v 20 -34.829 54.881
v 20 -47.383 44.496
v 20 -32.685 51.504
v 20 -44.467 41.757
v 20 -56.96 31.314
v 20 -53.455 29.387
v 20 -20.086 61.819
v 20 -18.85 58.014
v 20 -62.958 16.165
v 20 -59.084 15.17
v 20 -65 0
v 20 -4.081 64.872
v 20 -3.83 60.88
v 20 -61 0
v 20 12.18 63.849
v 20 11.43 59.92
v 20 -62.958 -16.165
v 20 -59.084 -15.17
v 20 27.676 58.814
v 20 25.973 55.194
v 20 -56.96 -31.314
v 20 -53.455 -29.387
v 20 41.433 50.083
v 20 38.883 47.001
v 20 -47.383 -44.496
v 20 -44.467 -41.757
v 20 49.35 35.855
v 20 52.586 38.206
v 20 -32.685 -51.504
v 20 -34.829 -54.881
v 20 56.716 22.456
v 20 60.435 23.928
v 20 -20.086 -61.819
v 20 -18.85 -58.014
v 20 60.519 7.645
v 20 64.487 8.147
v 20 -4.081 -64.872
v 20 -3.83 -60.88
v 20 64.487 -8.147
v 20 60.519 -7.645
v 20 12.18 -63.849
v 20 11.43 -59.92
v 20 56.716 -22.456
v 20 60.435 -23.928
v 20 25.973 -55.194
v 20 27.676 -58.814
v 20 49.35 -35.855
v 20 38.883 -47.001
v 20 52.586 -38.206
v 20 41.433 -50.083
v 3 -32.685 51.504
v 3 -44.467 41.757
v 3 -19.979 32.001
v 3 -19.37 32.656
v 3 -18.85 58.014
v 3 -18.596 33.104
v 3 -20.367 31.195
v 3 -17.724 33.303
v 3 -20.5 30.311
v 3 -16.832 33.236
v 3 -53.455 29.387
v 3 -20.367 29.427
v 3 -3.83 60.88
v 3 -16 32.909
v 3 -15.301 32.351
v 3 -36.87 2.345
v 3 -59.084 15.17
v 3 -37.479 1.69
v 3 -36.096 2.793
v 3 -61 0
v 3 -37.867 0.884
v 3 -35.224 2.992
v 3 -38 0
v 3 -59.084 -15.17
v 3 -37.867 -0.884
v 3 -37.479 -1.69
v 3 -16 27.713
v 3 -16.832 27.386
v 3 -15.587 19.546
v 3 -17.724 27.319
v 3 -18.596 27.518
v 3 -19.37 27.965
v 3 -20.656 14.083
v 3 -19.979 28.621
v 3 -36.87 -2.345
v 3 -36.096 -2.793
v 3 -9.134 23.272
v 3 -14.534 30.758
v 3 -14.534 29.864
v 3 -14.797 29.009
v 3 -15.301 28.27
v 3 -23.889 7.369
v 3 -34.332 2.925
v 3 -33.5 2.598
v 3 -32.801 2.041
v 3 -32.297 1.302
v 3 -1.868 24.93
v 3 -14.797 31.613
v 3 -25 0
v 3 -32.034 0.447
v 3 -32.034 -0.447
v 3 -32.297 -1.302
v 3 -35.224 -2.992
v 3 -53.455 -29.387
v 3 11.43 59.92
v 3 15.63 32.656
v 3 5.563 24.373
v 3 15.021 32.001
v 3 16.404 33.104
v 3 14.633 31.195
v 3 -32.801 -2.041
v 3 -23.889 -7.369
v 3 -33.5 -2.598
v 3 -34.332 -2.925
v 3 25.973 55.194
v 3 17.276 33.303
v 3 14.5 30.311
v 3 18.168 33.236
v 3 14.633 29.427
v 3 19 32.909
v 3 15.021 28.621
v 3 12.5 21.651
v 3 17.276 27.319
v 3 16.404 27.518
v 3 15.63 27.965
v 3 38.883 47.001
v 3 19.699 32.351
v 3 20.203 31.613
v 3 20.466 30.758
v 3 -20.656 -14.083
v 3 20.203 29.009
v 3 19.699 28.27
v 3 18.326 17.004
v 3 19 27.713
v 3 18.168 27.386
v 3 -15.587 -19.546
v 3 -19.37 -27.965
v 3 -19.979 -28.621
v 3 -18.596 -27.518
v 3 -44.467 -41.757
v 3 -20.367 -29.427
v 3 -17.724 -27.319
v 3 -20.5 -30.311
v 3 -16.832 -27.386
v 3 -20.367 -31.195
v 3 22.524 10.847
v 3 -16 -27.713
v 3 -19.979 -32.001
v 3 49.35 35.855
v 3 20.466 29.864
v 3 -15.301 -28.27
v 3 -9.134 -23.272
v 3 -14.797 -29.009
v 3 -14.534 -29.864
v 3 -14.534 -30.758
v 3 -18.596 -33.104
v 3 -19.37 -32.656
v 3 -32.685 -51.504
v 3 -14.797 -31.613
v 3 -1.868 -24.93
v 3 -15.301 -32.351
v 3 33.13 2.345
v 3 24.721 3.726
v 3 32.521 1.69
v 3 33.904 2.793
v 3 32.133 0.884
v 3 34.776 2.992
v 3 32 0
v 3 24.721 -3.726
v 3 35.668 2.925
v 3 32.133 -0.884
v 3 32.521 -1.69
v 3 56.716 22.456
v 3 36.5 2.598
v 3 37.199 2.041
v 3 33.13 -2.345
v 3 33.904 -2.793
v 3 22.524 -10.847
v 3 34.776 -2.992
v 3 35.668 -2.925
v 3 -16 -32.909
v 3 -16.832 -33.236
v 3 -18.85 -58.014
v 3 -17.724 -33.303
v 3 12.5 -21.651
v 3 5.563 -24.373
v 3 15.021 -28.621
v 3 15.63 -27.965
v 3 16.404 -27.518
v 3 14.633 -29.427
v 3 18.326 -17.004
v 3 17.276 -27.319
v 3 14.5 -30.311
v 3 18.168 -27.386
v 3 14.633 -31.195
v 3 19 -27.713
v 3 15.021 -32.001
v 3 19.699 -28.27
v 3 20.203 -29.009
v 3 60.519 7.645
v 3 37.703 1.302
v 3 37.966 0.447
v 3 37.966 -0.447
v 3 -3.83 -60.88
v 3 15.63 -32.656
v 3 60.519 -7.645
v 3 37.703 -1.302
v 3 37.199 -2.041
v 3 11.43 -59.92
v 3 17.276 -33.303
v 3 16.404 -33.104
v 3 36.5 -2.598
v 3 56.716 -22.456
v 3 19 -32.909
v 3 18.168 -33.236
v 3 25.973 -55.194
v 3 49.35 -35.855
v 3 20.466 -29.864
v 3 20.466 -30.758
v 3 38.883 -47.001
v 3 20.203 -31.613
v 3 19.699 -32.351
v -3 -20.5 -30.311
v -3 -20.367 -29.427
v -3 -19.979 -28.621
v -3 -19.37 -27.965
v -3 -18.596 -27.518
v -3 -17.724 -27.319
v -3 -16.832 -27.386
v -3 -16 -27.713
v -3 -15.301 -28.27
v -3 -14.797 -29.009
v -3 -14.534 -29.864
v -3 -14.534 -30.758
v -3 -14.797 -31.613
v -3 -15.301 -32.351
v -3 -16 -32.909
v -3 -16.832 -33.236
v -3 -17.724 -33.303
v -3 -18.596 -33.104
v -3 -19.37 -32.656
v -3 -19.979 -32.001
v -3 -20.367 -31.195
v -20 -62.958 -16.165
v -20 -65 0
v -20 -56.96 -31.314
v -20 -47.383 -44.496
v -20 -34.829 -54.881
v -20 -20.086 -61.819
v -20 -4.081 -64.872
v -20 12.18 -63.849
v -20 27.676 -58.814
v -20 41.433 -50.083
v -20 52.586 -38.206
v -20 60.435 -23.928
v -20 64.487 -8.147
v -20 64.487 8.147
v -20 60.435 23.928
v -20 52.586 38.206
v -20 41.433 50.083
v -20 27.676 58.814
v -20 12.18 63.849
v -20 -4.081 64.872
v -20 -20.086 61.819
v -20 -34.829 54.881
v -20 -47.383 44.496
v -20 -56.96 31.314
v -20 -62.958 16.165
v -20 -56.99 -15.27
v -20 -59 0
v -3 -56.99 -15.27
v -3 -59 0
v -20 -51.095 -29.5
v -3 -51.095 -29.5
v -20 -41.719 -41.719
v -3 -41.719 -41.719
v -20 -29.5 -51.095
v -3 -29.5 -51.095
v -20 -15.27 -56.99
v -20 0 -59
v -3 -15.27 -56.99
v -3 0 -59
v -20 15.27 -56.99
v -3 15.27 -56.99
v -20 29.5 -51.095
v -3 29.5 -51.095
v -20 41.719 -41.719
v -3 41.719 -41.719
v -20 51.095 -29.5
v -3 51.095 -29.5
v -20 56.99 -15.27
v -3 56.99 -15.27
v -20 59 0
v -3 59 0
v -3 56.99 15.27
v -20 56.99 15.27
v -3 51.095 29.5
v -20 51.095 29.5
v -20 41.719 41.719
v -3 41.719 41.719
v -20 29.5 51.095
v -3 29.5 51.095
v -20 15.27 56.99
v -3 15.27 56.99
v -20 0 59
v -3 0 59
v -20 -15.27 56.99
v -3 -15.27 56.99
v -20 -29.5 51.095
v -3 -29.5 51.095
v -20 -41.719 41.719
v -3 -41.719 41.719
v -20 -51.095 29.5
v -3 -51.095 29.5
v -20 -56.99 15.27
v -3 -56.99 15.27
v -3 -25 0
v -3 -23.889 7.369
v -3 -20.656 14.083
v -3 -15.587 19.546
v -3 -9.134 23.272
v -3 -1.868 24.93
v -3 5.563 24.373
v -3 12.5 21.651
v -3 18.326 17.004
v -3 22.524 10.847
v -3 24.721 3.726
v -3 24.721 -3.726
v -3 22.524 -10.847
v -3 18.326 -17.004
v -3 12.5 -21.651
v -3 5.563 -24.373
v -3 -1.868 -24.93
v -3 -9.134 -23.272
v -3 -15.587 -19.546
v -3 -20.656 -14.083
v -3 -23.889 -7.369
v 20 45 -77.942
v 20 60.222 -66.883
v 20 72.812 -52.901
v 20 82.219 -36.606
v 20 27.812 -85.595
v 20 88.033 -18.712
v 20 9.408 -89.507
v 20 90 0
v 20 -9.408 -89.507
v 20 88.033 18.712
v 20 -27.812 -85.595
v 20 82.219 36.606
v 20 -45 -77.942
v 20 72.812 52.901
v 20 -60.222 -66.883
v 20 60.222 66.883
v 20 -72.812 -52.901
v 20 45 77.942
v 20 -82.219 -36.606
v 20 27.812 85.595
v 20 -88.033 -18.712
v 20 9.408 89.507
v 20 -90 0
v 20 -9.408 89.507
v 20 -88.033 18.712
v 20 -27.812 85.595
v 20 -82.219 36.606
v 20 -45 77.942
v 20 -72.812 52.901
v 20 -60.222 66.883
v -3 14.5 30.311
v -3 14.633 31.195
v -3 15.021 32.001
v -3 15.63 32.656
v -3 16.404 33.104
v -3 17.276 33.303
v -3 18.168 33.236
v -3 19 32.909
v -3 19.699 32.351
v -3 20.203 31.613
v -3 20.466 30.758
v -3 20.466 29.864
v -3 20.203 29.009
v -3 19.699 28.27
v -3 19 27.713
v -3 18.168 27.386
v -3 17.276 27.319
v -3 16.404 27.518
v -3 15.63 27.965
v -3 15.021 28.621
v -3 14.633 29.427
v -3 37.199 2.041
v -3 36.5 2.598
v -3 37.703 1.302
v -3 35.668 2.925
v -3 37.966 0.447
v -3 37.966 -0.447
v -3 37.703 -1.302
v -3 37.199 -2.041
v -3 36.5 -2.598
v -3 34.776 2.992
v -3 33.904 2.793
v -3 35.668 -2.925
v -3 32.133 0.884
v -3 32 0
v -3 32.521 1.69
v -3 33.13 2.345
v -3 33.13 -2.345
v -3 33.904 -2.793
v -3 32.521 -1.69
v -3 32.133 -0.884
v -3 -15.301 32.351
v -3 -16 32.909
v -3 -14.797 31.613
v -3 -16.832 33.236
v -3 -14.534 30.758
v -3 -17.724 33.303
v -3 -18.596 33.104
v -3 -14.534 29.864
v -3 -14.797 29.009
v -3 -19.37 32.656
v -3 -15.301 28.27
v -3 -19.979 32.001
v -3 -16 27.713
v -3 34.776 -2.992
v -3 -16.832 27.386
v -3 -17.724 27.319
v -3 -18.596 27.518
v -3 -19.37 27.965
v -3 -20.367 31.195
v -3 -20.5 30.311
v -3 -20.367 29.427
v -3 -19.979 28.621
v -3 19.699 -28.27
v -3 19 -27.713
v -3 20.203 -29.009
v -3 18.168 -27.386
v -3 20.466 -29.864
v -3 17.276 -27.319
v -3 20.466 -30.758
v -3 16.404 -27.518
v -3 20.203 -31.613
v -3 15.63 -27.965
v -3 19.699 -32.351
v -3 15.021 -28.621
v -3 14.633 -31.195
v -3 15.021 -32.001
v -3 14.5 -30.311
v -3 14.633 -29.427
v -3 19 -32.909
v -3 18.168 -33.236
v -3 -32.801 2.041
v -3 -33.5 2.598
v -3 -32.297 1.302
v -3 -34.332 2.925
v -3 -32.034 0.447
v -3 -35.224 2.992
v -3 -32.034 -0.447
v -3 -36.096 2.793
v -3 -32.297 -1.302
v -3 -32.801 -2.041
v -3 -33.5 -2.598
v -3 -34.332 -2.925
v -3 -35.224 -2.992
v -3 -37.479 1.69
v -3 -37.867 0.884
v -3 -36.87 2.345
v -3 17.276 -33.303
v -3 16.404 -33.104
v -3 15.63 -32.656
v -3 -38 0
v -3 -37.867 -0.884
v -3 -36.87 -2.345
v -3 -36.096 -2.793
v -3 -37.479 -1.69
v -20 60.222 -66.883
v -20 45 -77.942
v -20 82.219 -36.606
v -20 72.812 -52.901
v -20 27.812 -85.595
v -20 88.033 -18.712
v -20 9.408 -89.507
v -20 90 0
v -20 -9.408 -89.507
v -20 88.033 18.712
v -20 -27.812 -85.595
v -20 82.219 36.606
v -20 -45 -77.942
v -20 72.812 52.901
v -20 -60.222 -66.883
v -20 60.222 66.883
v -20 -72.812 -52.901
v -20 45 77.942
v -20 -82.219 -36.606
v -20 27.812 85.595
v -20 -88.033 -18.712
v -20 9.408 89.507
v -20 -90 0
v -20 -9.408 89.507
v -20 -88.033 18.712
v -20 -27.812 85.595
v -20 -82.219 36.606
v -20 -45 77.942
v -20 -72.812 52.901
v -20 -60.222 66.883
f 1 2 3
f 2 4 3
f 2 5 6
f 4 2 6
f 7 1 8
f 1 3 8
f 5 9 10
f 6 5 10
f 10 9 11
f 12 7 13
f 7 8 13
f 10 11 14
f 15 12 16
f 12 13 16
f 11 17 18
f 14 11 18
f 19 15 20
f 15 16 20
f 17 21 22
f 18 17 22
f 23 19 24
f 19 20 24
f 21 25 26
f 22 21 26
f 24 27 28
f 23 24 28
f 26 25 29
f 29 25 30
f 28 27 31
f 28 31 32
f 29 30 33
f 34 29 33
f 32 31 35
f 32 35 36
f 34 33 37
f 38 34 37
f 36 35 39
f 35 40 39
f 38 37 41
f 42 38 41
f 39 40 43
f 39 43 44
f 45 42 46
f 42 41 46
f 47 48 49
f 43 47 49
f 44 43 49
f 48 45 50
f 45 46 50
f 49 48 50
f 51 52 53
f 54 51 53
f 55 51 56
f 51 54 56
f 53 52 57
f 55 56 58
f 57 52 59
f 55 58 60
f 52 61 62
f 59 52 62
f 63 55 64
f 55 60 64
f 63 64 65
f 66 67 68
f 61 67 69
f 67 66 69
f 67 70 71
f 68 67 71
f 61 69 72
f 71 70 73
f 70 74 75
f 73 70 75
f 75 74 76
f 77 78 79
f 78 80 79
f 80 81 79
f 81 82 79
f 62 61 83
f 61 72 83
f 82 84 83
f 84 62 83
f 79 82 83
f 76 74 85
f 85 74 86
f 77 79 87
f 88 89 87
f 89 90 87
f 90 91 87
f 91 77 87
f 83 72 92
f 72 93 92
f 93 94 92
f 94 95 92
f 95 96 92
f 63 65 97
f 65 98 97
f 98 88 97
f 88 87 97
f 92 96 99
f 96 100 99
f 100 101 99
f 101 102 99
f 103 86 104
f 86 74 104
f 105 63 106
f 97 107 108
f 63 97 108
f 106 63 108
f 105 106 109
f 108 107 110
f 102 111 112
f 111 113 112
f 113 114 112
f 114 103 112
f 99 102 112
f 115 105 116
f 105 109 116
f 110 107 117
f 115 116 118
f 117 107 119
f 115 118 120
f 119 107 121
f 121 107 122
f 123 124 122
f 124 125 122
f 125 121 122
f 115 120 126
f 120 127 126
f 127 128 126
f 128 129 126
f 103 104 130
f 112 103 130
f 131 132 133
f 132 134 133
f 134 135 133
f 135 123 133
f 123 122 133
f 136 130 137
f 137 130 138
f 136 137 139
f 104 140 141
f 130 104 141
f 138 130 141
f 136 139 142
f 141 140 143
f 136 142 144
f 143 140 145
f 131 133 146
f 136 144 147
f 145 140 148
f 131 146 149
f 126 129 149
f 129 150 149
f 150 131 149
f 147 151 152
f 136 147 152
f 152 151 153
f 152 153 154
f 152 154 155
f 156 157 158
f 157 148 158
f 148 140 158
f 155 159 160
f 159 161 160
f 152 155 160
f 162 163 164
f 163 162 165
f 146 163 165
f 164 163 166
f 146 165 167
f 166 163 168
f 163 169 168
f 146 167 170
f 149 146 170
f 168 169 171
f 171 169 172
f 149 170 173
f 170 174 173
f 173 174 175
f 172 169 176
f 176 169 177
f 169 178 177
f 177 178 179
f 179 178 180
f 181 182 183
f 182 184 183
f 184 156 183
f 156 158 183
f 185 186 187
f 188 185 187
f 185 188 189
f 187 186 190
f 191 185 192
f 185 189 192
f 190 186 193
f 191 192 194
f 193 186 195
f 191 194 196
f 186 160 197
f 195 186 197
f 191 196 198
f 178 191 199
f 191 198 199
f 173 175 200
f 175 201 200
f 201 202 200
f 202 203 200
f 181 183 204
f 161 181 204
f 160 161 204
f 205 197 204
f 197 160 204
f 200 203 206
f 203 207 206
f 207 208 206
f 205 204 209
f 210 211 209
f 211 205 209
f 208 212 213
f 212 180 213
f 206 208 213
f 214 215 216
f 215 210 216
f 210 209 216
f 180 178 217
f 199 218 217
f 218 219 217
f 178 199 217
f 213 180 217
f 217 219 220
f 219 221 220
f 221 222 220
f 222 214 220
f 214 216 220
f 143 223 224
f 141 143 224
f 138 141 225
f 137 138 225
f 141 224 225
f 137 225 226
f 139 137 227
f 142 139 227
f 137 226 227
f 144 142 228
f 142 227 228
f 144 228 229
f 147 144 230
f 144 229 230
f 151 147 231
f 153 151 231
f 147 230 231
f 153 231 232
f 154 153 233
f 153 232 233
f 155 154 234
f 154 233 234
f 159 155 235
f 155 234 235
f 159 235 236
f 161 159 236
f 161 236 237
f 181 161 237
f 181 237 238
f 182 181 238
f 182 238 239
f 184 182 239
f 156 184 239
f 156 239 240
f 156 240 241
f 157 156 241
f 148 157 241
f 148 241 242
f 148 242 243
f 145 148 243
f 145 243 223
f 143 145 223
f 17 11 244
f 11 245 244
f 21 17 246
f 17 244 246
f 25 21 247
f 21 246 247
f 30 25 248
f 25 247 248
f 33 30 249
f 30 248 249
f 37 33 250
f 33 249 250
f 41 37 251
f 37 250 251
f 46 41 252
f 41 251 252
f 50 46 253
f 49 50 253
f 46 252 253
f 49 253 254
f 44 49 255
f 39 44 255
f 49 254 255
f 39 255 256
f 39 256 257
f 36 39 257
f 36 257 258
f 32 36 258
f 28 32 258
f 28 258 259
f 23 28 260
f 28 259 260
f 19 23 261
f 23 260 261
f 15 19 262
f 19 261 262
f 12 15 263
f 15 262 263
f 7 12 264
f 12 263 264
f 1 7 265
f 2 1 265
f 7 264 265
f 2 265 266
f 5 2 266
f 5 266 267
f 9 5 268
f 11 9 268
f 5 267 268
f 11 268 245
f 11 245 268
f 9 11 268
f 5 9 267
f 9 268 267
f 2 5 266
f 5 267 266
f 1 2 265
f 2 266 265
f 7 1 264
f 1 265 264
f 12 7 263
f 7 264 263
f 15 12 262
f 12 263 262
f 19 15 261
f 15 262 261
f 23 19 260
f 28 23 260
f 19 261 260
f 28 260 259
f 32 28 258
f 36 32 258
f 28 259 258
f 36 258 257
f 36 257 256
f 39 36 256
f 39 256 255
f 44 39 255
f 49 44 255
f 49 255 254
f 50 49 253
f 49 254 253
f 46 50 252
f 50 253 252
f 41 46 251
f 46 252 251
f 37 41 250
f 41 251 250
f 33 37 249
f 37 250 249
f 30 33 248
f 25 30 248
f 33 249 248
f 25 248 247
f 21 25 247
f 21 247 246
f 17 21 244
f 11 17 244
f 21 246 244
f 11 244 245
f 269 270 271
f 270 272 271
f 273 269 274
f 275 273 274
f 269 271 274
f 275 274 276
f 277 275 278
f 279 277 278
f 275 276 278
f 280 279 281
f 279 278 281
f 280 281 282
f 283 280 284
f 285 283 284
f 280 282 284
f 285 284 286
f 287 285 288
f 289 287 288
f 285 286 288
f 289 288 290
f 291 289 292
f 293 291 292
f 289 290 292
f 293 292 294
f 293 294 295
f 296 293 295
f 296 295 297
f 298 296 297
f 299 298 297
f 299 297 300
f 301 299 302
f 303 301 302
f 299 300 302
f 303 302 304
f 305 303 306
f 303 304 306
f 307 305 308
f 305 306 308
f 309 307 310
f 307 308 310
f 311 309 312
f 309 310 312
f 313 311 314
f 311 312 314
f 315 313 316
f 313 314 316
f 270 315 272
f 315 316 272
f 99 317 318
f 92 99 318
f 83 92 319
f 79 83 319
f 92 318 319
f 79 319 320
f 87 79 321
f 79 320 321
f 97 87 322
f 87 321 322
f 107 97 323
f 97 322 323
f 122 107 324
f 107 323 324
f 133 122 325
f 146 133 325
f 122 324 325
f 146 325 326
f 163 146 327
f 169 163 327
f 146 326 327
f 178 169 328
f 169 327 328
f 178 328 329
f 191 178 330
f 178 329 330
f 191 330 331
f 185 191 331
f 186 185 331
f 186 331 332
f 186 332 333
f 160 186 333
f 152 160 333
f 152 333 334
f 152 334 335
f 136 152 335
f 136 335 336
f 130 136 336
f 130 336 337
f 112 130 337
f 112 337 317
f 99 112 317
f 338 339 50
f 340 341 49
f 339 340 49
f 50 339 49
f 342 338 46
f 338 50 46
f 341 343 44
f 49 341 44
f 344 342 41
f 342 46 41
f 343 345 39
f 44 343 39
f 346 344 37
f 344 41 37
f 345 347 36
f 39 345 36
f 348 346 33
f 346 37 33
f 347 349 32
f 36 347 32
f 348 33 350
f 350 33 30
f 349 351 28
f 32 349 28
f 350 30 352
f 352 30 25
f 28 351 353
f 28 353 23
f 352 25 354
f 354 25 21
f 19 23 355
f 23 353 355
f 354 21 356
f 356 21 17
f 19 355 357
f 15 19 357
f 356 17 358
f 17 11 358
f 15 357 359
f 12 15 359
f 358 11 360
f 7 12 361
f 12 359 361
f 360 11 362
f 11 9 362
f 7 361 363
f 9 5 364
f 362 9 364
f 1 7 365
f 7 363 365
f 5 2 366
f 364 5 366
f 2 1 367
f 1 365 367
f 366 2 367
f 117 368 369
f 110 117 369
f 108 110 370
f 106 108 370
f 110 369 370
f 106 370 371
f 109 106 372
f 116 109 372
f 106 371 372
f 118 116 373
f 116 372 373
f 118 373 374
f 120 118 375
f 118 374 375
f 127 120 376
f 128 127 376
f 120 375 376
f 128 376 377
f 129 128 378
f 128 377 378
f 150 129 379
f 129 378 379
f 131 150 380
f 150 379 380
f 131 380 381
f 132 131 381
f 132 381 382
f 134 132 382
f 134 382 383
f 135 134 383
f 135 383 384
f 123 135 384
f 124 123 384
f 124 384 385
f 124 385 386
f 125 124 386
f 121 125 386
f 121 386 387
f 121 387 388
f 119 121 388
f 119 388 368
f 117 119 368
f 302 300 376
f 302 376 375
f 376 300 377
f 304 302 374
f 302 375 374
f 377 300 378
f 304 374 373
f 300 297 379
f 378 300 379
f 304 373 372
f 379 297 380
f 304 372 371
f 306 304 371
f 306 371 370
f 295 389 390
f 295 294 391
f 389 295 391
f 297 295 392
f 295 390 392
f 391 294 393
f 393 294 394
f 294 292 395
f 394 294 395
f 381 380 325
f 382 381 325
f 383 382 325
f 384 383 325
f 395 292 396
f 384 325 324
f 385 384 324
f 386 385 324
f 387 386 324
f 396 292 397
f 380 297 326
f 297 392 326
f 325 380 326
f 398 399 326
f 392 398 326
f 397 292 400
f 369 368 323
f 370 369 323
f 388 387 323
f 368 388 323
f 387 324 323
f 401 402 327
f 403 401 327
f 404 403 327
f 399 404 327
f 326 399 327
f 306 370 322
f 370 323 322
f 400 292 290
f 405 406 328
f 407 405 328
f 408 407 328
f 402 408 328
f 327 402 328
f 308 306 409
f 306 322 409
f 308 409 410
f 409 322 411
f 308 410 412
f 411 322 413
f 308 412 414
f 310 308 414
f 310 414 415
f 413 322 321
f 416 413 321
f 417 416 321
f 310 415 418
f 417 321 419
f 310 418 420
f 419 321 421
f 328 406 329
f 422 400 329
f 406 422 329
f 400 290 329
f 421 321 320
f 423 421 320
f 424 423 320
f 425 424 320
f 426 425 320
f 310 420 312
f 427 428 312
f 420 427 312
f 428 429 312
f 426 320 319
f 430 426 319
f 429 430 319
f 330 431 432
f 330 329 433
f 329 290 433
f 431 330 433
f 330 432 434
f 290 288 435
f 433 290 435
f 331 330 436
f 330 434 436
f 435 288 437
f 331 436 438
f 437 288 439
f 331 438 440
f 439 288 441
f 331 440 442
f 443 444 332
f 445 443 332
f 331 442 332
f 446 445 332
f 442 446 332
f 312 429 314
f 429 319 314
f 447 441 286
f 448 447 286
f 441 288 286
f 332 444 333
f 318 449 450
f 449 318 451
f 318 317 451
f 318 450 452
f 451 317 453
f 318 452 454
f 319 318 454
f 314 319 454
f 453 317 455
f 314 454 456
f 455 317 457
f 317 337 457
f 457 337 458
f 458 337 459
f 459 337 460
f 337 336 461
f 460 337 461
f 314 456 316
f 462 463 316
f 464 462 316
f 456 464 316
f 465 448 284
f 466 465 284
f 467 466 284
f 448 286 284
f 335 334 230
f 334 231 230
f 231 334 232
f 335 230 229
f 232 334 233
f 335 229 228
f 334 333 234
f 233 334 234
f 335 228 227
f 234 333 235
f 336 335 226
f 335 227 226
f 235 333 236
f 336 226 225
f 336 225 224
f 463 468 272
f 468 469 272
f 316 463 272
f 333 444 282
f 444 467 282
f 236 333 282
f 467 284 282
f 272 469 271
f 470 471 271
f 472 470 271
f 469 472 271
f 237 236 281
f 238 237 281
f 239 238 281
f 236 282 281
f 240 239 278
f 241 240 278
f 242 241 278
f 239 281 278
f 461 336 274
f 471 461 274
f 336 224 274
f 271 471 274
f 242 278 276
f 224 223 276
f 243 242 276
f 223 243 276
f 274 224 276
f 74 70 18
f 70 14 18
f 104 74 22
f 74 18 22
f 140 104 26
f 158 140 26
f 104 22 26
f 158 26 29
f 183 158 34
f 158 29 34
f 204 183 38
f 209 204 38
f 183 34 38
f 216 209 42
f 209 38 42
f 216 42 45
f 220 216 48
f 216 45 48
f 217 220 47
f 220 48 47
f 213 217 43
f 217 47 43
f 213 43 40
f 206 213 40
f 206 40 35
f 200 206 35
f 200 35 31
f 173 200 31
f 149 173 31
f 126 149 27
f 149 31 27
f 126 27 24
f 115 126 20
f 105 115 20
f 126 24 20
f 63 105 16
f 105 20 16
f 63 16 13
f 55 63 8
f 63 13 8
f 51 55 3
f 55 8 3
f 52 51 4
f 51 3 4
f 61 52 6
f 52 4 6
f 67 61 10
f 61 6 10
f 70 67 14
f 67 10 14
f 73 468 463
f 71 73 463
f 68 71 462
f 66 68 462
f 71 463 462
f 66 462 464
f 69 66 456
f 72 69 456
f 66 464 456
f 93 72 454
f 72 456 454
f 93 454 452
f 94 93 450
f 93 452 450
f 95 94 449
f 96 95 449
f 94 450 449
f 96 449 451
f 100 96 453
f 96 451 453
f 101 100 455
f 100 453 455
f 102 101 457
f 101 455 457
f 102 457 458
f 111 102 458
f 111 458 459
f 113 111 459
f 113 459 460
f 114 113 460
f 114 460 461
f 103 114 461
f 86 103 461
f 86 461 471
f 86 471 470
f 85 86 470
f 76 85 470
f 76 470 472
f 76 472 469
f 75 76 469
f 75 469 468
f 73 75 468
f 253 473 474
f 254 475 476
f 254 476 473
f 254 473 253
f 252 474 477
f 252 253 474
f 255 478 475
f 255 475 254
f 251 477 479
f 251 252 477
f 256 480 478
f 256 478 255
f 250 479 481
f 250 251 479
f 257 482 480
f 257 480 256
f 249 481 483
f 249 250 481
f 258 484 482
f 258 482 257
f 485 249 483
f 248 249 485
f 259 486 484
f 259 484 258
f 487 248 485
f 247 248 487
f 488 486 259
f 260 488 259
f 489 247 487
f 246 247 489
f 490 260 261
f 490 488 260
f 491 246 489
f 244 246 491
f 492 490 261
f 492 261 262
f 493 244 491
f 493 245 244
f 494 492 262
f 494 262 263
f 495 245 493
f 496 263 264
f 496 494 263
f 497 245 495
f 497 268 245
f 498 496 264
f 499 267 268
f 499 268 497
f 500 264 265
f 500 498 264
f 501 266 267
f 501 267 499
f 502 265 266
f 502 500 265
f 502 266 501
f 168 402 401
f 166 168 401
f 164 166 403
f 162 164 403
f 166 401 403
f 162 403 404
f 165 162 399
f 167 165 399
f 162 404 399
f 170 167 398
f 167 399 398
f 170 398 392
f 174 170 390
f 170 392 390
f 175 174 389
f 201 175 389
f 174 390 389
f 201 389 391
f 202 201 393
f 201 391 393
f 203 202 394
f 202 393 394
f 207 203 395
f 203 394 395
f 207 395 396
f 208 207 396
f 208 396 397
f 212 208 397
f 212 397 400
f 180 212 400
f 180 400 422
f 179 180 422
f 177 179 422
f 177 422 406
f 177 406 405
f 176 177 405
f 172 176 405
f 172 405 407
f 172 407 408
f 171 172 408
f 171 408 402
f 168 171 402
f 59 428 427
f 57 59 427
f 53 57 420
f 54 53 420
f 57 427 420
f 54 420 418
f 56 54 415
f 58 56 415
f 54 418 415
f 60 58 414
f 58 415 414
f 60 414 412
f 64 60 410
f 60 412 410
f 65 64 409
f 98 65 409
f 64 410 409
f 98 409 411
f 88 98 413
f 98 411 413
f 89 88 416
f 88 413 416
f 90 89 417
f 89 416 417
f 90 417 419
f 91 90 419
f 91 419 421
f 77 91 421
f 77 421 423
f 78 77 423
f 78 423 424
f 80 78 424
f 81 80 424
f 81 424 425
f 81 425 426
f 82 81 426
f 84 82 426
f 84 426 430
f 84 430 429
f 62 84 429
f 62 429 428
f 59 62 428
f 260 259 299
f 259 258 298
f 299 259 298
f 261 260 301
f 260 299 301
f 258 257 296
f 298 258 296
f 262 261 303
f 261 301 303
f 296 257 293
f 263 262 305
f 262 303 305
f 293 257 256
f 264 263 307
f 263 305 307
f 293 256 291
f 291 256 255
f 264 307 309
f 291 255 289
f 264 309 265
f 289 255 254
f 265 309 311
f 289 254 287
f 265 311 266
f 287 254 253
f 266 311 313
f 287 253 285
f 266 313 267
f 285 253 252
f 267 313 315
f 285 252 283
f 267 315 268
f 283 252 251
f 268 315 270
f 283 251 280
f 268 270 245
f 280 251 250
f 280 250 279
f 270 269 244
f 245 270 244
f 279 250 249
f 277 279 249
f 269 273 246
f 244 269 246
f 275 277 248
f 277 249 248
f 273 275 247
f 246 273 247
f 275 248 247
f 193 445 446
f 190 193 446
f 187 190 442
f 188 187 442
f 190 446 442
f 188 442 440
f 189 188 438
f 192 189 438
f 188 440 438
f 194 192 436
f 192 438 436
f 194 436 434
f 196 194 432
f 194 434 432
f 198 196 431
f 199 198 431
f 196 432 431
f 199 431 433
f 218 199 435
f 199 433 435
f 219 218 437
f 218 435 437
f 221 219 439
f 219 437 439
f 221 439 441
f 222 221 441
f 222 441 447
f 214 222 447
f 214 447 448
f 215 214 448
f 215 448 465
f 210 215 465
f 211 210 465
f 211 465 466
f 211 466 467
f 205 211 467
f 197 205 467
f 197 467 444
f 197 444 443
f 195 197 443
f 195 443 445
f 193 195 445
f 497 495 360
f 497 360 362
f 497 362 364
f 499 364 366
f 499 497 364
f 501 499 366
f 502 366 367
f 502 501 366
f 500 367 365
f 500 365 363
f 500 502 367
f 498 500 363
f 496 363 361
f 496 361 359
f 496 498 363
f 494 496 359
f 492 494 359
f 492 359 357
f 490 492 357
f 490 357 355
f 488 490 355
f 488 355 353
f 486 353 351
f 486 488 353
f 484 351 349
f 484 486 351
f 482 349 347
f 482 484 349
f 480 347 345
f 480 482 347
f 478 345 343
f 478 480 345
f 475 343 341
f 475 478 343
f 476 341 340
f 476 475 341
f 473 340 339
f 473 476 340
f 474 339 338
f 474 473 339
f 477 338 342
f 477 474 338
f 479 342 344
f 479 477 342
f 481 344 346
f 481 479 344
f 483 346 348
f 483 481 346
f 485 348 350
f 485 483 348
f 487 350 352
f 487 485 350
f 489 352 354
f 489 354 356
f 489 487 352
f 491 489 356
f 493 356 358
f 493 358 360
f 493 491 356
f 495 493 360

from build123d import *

# Parameters (mm, degrees)
SKETCH2_R           = 25
SKETCH2_R_2         = 3
CUT_EXTRUDE1_DEPTH  = 95.757585448
SKETCH4_R           = 90
SKETCH4_R_2         = 65
BOSS_EXTRUDE1_DEPTH = 40


with BuildPart() as part:
    # Sketch1 → Revolve1 (revolve)
    with BuildSketch(Plane.XY, mode=Mode.PRIVATE) as revolve1_sk:
        Polygon((0, 65), (-20, 65), (-20, 59), (-3, 59), (-3, 0), (3, 0), (3, 61), (20, 61), (20, 65), align=None)
    revolve(revolve1_sk.sketch.rotate(Axis((-3, 0, 0), (1, 0, 0)), 180), axis=Axis((-3, 0, 0), (1, 0, 0)))

    # Sketch2 → Cut-Extrude1 (cut, through all)
    with BuildSketch(Plane.ZY.offset(3)):
        with Locations(Location((0, 0, 0), (0, 0, 270))):
            Circle(SKETCH2_R)
        with Locations(Location((0, 35, 0), (0, 0, 270))):
            Circle(SKETCH2_R_2)
        with Locations(Location((30.310889132, 17.5, 0), (0, 0, 270))):
            Circle(SKETCH2_R_2)
        with Locations(Location((30.310889132, -17.5, 0), (0, 0, 270))):
            Circle(SKETCH2_R_2)
        with Locations(Location((0, -35, 0), (0, 0, 270))):
            Circle(SKETCH2_R_2)
        with Locations(Location((-30.310889132, -17.5, 0), (0, 0, 270))):
            Circle(SKETCH2_R_2)
        with Locations(Location((-30.310889132, 17.5, 0), (0, 0, 270))):
            Circle(SKETCH2_R_2)
    extrude(amount=-CUT_EXTRUDE1_DEPTH, mode=Mode.SUBTRACT)


with BuildPart() as body_2:
    # Sketch4 → Boss-Extrude1 (new body)
    with BuildSketch(Plane.ZY.offset(20)):
        with Locations(Location((0, 0, 0), (0, 0, 270))):
            Circle(SKETCH4_R)
        with Locations(Location((0, 0, 0), (0, 0, 270))):
            Circle(SKETCH4_R_2, mode=Mode.SUBTRACT)
    extrude(amount=-BOSS_EXTRUDE1_DEPTH)


solid = Compound([part.part, body_2.part])
